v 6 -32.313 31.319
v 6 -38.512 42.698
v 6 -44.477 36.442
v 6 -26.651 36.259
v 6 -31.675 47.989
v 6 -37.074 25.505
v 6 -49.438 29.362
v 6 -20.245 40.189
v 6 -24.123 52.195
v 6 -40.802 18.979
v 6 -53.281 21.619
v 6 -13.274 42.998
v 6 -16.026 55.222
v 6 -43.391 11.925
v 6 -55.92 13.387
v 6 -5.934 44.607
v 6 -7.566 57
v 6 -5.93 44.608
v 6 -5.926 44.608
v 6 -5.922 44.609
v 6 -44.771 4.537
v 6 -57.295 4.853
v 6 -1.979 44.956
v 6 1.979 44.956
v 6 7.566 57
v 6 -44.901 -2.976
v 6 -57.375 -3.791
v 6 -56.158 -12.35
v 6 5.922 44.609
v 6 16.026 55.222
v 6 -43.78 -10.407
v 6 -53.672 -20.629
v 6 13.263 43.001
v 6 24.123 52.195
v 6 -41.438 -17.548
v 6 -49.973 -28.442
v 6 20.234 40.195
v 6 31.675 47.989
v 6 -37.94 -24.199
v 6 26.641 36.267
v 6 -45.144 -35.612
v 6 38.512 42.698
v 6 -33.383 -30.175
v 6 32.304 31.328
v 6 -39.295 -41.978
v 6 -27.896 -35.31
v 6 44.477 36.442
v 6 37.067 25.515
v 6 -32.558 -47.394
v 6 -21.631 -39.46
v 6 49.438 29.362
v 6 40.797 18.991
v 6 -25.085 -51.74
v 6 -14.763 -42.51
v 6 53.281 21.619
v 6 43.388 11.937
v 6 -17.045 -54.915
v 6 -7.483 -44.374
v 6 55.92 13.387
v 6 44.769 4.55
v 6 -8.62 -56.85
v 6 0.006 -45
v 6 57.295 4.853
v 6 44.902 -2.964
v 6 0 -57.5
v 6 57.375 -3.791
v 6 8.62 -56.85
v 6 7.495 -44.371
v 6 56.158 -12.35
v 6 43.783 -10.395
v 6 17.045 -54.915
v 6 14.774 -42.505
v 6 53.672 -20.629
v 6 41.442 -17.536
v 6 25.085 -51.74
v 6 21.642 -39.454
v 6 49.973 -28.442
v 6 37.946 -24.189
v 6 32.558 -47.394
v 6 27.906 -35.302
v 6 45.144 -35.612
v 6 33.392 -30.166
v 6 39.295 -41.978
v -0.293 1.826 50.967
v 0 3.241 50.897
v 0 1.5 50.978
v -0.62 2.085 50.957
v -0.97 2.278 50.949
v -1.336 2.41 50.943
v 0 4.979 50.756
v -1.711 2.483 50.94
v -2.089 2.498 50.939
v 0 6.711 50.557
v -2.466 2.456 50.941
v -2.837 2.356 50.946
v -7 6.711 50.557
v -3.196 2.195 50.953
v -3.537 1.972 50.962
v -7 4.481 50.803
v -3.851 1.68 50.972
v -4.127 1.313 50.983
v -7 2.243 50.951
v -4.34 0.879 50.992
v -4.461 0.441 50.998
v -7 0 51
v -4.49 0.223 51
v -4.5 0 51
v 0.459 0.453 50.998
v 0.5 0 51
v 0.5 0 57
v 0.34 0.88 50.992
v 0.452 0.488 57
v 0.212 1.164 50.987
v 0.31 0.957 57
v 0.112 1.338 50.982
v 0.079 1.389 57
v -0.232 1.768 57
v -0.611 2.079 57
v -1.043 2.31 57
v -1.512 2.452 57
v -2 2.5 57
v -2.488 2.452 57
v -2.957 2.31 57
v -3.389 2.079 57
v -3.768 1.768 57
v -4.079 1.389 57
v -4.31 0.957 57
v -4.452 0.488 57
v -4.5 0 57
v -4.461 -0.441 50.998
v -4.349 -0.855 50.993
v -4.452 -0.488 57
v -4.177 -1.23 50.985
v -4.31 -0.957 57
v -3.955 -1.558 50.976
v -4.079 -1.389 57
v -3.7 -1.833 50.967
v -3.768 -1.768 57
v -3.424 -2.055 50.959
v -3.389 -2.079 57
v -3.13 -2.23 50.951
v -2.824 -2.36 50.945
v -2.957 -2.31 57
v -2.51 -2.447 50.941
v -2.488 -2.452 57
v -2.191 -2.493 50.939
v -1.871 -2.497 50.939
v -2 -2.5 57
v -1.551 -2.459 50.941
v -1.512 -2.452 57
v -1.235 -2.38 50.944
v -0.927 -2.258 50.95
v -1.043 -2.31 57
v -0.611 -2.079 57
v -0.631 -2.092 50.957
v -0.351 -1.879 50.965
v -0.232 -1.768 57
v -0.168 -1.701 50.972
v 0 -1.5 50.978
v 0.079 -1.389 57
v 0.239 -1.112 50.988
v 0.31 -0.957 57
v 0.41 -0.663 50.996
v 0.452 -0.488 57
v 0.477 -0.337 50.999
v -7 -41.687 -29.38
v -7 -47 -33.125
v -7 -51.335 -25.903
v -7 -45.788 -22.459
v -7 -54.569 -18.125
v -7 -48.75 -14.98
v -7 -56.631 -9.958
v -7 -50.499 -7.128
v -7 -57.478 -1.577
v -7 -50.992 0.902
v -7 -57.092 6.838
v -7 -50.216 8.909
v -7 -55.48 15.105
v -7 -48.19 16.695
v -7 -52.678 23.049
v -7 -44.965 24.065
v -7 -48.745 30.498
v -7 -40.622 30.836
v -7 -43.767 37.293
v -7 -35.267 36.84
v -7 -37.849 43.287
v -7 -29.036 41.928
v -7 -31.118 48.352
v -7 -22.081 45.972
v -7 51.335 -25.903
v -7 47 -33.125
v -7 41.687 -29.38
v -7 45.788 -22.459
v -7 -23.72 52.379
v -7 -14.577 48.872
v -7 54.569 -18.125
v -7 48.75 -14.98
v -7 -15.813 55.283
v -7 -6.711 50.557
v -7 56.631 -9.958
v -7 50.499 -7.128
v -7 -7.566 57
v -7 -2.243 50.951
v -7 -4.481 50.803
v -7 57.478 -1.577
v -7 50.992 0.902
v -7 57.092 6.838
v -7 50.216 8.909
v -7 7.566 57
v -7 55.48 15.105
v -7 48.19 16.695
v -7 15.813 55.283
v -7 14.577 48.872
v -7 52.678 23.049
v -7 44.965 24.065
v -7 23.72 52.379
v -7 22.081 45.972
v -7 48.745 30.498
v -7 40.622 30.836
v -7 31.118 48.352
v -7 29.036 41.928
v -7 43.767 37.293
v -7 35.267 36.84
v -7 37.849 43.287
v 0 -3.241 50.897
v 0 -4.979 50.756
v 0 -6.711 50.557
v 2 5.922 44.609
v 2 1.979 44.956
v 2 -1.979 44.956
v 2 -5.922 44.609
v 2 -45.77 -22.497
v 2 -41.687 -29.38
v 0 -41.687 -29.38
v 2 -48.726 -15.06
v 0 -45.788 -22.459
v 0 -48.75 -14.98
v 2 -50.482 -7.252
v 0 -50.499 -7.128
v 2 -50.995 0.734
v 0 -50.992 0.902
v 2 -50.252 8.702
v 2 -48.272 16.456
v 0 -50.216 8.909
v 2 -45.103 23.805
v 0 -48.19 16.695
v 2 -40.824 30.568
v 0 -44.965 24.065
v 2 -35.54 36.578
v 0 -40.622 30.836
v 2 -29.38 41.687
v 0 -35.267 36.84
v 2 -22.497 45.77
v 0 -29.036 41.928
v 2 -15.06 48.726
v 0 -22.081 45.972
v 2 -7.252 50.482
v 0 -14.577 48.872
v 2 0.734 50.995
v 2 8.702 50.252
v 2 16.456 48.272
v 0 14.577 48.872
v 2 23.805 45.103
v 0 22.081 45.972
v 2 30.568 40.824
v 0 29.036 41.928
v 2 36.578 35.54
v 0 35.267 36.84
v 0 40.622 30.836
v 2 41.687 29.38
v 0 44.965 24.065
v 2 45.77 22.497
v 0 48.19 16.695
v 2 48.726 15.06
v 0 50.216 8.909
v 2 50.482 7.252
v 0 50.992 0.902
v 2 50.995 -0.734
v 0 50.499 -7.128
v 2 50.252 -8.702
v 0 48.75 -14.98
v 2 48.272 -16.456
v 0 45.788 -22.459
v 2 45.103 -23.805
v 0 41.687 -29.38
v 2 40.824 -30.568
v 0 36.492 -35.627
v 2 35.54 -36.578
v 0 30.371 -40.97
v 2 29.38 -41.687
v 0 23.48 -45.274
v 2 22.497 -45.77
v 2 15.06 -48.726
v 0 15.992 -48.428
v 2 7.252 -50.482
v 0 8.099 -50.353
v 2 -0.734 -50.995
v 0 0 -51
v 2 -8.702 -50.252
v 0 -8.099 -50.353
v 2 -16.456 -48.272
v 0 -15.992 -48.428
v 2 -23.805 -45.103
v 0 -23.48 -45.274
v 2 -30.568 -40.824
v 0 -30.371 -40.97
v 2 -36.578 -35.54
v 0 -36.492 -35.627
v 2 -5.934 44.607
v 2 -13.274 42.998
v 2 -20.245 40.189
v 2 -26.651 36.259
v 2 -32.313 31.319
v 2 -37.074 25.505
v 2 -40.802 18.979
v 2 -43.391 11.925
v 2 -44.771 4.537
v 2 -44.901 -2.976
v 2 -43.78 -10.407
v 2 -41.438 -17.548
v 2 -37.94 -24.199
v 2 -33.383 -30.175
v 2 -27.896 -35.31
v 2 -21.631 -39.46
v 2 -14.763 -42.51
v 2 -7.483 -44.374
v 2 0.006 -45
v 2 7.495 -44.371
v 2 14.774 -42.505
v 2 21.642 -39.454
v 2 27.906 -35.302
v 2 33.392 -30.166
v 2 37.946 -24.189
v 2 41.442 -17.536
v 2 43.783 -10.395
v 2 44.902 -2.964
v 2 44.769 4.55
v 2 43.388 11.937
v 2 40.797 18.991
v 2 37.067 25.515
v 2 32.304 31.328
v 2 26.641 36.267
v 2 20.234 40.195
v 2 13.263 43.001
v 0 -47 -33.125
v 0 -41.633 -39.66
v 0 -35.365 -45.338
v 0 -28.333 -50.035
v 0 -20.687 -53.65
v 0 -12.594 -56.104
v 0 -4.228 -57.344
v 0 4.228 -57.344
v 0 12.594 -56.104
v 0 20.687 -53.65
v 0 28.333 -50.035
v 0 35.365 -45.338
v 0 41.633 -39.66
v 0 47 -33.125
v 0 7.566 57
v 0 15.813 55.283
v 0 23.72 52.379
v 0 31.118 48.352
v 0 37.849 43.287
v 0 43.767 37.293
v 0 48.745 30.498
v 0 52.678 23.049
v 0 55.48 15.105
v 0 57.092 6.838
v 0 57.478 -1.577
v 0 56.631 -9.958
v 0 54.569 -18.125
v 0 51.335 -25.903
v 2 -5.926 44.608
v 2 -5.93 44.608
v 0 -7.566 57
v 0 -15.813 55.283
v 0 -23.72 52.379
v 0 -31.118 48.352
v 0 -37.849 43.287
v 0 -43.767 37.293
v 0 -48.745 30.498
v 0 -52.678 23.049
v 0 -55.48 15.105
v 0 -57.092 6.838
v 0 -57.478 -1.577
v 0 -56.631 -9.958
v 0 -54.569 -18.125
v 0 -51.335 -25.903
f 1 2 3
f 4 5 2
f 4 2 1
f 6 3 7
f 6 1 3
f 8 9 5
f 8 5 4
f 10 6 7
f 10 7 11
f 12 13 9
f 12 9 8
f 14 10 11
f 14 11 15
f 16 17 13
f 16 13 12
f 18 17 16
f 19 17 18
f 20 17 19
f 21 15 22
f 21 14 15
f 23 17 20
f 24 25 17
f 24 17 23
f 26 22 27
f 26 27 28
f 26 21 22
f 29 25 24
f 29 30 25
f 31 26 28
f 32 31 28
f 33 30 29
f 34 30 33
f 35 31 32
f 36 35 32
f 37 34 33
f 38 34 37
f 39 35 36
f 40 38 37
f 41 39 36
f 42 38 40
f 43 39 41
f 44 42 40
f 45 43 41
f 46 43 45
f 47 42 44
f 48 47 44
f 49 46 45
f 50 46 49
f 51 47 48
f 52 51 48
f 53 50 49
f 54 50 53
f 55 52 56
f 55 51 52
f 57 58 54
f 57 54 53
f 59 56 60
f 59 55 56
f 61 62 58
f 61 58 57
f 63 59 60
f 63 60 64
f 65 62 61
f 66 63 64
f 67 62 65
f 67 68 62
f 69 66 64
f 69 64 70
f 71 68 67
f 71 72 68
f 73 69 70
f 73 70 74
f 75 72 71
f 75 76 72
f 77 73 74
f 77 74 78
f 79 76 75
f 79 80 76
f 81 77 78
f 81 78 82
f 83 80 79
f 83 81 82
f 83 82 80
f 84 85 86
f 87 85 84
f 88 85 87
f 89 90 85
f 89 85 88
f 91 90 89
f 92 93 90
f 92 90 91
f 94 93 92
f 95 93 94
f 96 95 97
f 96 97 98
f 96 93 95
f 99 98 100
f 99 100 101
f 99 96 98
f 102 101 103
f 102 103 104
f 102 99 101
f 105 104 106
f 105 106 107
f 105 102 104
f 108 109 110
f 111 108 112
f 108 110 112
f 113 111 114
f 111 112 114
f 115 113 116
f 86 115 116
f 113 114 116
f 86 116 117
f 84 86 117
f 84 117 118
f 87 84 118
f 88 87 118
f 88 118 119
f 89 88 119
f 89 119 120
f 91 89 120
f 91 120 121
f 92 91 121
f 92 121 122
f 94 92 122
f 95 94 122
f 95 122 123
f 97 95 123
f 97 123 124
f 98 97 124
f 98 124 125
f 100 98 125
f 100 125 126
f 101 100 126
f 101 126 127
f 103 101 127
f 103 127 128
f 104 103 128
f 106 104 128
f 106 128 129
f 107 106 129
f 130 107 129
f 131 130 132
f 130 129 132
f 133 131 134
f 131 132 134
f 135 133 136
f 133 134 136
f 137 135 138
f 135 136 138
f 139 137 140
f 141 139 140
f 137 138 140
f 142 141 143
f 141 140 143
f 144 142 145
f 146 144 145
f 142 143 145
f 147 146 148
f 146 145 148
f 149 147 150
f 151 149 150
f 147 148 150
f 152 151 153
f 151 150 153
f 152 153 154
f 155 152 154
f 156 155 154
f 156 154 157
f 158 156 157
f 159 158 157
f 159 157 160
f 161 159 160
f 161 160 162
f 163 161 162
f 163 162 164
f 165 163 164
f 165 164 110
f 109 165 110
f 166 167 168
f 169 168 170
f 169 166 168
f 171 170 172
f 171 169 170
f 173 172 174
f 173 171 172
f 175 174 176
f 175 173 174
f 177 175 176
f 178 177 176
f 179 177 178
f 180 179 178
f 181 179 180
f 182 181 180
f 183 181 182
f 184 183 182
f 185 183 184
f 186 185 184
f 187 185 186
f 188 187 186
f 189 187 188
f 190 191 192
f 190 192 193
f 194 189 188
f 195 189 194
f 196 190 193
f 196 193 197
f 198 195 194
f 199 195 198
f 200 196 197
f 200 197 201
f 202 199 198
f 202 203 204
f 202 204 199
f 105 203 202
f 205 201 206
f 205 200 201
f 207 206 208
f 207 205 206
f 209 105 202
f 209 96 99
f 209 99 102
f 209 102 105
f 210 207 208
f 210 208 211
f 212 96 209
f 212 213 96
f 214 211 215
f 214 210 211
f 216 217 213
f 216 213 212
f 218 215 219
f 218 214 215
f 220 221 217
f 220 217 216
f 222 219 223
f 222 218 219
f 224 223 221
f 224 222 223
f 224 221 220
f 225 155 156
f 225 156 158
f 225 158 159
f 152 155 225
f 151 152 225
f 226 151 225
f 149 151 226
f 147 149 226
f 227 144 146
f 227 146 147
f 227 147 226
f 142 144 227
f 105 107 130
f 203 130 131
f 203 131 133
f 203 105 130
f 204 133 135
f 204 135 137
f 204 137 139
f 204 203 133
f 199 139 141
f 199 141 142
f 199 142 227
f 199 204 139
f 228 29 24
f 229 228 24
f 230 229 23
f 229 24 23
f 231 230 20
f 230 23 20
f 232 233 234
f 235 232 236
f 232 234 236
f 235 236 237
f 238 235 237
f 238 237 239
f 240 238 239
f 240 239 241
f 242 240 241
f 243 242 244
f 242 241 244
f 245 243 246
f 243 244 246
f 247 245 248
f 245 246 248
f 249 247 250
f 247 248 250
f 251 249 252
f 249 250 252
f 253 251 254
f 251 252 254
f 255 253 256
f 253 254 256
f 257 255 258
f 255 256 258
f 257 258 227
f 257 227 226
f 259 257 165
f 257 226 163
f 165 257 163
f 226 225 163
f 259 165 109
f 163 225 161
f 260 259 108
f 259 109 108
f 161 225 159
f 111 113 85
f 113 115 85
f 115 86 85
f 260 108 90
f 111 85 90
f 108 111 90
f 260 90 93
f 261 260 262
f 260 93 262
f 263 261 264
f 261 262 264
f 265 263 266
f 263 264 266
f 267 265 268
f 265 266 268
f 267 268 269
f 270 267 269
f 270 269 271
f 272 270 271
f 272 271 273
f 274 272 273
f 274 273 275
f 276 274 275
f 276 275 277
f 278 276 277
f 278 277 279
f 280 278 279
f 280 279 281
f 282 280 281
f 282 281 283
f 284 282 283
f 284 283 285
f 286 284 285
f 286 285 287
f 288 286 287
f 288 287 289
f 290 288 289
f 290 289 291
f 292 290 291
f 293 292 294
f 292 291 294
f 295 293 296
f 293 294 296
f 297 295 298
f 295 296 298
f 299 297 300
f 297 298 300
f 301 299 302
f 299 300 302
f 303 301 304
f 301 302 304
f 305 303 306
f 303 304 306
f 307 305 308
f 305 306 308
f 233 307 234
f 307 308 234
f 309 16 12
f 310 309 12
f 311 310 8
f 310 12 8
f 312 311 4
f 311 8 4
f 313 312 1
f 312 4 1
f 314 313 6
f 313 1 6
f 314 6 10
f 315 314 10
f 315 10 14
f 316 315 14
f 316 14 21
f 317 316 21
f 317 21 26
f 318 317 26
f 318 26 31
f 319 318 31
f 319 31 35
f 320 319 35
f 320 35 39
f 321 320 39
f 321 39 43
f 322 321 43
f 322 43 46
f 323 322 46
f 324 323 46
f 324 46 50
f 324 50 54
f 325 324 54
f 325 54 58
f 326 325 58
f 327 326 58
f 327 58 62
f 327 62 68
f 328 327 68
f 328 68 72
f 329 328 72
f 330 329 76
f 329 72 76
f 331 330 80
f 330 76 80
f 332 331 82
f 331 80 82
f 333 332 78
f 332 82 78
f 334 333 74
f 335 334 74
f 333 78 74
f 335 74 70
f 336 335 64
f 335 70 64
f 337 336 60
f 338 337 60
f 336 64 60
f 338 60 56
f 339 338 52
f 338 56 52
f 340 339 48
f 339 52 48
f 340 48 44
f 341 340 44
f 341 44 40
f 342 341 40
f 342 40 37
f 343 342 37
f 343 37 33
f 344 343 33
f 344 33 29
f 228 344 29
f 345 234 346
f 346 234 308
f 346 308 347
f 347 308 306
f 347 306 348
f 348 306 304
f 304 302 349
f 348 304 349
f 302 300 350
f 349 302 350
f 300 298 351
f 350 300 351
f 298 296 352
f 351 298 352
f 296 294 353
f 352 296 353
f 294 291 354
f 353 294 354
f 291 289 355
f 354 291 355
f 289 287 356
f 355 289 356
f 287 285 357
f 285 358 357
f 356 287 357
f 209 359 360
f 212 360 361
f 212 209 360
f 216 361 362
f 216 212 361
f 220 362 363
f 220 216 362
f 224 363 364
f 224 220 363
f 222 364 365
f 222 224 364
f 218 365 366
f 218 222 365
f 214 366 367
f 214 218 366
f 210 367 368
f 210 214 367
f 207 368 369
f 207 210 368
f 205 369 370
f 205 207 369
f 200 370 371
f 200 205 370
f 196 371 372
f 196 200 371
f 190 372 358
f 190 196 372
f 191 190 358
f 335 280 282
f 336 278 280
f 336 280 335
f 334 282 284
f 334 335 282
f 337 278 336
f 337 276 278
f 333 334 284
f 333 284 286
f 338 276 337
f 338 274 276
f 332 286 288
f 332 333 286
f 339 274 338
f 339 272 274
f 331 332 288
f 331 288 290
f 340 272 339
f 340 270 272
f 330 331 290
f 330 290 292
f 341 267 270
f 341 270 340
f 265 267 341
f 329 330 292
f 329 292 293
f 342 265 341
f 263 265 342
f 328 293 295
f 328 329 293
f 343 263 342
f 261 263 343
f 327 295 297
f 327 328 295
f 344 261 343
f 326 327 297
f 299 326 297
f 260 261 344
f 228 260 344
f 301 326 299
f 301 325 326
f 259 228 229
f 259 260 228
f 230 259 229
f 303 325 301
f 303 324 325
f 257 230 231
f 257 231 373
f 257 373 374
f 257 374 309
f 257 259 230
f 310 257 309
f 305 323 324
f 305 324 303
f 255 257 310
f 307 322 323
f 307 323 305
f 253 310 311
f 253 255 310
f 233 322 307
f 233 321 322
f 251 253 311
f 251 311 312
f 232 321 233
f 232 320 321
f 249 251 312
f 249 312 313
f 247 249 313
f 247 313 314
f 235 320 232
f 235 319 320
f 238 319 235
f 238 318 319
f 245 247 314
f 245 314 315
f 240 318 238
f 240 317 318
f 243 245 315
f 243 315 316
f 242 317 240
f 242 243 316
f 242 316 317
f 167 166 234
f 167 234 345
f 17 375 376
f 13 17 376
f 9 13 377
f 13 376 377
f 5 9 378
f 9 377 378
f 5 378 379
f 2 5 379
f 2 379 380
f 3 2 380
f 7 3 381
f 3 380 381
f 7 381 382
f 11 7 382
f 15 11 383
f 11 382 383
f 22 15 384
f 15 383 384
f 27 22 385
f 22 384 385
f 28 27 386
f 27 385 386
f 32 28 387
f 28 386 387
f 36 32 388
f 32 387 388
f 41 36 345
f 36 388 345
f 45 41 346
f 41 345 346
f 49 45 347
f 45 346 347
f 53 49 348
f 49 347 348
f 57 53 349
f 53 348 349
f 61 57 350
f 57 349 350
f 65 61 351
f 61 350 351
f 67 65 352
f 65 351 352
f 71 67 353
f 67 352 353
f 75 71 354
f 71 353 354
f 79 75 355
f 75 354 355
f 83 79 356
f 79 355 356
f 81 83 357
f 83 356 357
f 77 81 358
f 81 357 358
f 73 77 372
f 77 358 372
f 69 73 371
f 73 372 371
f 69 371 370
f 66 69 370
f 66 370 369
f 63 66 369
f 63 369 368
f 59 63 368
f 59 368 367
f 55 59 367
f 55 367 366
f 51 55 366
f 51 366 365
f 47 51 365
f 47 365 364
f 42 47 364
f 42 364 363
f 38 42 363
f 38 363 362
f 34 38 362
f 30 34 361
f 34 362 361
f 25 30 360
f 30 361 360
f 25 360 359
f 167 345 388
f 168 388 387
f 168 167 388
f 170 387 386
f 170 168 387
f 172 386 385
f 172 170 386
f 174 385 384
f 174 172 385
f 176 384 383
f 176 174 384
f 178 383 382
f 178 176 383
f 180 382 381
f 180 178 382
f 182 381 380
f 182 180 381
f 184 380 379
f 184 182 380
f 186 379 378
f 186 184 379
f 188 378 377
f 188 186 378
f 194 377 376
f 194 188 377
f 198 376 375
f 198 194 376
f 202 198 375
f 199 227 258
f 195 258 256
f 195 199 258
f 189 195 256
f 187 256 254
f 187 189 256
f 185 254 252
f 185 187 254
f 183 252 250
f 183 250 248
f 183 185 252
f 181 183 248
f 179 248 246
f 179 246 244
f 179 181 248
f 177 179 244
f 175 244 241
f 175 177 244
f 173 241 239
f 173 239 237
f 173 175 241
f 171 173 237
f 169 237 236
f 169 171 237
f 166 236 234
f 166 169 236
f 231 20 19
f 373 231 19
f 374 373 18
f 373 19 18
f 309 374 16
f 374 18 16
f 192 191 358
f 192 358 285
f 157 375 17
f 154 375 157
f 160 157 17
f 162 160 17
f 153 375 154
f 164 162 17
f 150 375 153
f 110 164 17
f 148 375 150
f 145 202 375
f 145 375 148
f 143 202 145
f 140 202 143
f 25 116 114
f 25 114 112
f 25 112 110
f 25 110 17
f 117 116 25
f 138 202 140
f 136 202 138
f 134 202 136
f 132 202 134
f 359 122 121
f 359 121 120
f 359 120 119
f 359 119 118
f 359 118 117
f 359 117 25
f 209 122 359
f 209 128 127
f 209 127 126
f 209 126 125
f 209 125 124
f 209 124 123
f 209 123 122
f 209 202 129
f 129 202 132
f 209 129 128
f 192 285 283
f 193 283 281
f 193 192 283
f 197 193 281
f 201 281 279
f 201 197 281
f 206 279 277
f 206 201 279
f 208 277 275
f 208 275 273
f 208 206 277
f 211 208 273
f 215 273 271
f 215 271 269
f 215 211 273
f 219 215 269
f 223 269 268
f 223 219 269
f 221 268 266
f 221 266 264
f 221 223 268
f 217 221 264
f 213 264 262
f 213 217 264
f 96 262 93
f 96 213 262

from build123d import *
from build123d.topology import SkipClean

# Parameters (mm, degrees)
BOSS_EXTRUDE1_DEPTH = 6
BOSS_EXTRUDE2_START = 7
BOSS_EXTRUDE2_DEPTH = 7
SKETCH3_R           = 2.5
CUT_EXTRUDE1_DEPTH  = 7
CUT_EXTRUDE2_REACH  = 84.35
SKETCH5_R           = 51
CUT_EXTRUDE3_DEPTH  = 2


with BuildPart() as part:
    # Sketch1 → Boss-Extrude1 (new body)
    with BuildSketch(Plane(origin=(0, 0, 0), x_dir=(0, 0, -1), z_dir=(1, 0, 0))):
        with BuildLine():
            Line((-57, 7.566372975), (-57, -7.566372975))
            ThreePointArc((-57, -7.566372975), (57.5, 0), (-57, 7.566372975))
        make_face()
    extrude(amount=BOSS_EXTRUDE1_DEPTH)

    # Sketch2 → Boss-Extrude2 (add)
    with SkipClean():  # the faces are left unmerged after this step: merging them gives an invalid solid
        with BuildSketch(Plane.ZY.offset(BOSS_EXTRUDE2_START)):
            with BuildLine():
                Line((-29.380225594, -41.686956522), (-33.12476415, -47))
                ThreePointArc((-33.12476415, -47), (23.049066289, -52.678179004), (57, -7.566372975))
                Line((57, -7.566372975), (57, 7.566372975))
                ThreePointArc((57, 7.566372975), (23.049066289, 52.678179004), (-33.12476415, 47))
                Line((-33.12476415, 47), (-29.380225594, 41.686956522))
                ThreePointArc((-29.380225594, 41.686956522), (20.443519665, 46.723254421), (50.556521739, 6.711043856))
                ThreePointArc((50.556521739, 6.711043856), (50.889009662, 3.362840414), (51, 0))
                ThreePointArc((51, 0), (50.889009662, -3.362840414), (50.556521739, -6.711043856))
                ThreePointArc((50.556521739, -6.711043856), (20.443519665, -46.723254421), (-29.380225594, -41.686956522))
            make_face()
        extrude(amount=-BOSS_EXTRUDE2_DEPTH)

    # Sketch3 → Cut-Extrude1 (cut)
    with SkipClean():  # the faces are left unmerged after this step: merging them gives an invalid solid
        with BuildSketch(Plane.XY.offset(57)):
            with Locations((-2, 0)):
                Circle(SKETCH3_R)
        extrude(amount=-CUT_EXTRUDE1_DEPTH, mode=Mode.SUBTRACT)

    # Sketch4 → Cut-Extrude2 (cut, up to next)
    with BuildSketch(Plane(origin=(6, 0, 0), x_dir=(0, 0, -1), z_dir=(1, 0, 0)), mode=Mode.PRIVATE) as cut_extrude2_sk1:
        with BuildLine():
            ThreePointArc((-44.60706125, -5.933808779), (44.999999572, 0.006203806), (-44.608695652, 5.921509285))
            ThreePointArc((-44.608695652, 5.921509285), (-45, 0), (-44.608695652, -5.921509285))
            ThreePointArc((-44.608695652, -5.921509285), (-44.607878875, -5.927659088), (-44.60706125, -5.933808779))
        make_face()
    cut_extrude2_tool1 = extrude(cut_extrude2_sk1.sketch, amount=-CUT_EXTRUDE2_REACH, mode=Mode.PRIVATE) & part.part
    add(cut_extrude2_tool1.solids().sort_by_distance((6, 0, 0))[0], mode=Mode.SUBTRACT)

    # Sketch5 → Cut-Extrude3 (cut)
    with SkipClean():  # the faces are left unmerged after this step: merging them gives an invalid solid
        with BuildSketch(Plane.ZY):
            with Locations(Location((0, 0, 0), (0, 0, 234.824499503))):
                Circle(SKETCH5_R)
        extrude(amount=-CUT_EXTRUDE3_DEPTH, mode=Mode.SUBTRACT)


solid = part.part
